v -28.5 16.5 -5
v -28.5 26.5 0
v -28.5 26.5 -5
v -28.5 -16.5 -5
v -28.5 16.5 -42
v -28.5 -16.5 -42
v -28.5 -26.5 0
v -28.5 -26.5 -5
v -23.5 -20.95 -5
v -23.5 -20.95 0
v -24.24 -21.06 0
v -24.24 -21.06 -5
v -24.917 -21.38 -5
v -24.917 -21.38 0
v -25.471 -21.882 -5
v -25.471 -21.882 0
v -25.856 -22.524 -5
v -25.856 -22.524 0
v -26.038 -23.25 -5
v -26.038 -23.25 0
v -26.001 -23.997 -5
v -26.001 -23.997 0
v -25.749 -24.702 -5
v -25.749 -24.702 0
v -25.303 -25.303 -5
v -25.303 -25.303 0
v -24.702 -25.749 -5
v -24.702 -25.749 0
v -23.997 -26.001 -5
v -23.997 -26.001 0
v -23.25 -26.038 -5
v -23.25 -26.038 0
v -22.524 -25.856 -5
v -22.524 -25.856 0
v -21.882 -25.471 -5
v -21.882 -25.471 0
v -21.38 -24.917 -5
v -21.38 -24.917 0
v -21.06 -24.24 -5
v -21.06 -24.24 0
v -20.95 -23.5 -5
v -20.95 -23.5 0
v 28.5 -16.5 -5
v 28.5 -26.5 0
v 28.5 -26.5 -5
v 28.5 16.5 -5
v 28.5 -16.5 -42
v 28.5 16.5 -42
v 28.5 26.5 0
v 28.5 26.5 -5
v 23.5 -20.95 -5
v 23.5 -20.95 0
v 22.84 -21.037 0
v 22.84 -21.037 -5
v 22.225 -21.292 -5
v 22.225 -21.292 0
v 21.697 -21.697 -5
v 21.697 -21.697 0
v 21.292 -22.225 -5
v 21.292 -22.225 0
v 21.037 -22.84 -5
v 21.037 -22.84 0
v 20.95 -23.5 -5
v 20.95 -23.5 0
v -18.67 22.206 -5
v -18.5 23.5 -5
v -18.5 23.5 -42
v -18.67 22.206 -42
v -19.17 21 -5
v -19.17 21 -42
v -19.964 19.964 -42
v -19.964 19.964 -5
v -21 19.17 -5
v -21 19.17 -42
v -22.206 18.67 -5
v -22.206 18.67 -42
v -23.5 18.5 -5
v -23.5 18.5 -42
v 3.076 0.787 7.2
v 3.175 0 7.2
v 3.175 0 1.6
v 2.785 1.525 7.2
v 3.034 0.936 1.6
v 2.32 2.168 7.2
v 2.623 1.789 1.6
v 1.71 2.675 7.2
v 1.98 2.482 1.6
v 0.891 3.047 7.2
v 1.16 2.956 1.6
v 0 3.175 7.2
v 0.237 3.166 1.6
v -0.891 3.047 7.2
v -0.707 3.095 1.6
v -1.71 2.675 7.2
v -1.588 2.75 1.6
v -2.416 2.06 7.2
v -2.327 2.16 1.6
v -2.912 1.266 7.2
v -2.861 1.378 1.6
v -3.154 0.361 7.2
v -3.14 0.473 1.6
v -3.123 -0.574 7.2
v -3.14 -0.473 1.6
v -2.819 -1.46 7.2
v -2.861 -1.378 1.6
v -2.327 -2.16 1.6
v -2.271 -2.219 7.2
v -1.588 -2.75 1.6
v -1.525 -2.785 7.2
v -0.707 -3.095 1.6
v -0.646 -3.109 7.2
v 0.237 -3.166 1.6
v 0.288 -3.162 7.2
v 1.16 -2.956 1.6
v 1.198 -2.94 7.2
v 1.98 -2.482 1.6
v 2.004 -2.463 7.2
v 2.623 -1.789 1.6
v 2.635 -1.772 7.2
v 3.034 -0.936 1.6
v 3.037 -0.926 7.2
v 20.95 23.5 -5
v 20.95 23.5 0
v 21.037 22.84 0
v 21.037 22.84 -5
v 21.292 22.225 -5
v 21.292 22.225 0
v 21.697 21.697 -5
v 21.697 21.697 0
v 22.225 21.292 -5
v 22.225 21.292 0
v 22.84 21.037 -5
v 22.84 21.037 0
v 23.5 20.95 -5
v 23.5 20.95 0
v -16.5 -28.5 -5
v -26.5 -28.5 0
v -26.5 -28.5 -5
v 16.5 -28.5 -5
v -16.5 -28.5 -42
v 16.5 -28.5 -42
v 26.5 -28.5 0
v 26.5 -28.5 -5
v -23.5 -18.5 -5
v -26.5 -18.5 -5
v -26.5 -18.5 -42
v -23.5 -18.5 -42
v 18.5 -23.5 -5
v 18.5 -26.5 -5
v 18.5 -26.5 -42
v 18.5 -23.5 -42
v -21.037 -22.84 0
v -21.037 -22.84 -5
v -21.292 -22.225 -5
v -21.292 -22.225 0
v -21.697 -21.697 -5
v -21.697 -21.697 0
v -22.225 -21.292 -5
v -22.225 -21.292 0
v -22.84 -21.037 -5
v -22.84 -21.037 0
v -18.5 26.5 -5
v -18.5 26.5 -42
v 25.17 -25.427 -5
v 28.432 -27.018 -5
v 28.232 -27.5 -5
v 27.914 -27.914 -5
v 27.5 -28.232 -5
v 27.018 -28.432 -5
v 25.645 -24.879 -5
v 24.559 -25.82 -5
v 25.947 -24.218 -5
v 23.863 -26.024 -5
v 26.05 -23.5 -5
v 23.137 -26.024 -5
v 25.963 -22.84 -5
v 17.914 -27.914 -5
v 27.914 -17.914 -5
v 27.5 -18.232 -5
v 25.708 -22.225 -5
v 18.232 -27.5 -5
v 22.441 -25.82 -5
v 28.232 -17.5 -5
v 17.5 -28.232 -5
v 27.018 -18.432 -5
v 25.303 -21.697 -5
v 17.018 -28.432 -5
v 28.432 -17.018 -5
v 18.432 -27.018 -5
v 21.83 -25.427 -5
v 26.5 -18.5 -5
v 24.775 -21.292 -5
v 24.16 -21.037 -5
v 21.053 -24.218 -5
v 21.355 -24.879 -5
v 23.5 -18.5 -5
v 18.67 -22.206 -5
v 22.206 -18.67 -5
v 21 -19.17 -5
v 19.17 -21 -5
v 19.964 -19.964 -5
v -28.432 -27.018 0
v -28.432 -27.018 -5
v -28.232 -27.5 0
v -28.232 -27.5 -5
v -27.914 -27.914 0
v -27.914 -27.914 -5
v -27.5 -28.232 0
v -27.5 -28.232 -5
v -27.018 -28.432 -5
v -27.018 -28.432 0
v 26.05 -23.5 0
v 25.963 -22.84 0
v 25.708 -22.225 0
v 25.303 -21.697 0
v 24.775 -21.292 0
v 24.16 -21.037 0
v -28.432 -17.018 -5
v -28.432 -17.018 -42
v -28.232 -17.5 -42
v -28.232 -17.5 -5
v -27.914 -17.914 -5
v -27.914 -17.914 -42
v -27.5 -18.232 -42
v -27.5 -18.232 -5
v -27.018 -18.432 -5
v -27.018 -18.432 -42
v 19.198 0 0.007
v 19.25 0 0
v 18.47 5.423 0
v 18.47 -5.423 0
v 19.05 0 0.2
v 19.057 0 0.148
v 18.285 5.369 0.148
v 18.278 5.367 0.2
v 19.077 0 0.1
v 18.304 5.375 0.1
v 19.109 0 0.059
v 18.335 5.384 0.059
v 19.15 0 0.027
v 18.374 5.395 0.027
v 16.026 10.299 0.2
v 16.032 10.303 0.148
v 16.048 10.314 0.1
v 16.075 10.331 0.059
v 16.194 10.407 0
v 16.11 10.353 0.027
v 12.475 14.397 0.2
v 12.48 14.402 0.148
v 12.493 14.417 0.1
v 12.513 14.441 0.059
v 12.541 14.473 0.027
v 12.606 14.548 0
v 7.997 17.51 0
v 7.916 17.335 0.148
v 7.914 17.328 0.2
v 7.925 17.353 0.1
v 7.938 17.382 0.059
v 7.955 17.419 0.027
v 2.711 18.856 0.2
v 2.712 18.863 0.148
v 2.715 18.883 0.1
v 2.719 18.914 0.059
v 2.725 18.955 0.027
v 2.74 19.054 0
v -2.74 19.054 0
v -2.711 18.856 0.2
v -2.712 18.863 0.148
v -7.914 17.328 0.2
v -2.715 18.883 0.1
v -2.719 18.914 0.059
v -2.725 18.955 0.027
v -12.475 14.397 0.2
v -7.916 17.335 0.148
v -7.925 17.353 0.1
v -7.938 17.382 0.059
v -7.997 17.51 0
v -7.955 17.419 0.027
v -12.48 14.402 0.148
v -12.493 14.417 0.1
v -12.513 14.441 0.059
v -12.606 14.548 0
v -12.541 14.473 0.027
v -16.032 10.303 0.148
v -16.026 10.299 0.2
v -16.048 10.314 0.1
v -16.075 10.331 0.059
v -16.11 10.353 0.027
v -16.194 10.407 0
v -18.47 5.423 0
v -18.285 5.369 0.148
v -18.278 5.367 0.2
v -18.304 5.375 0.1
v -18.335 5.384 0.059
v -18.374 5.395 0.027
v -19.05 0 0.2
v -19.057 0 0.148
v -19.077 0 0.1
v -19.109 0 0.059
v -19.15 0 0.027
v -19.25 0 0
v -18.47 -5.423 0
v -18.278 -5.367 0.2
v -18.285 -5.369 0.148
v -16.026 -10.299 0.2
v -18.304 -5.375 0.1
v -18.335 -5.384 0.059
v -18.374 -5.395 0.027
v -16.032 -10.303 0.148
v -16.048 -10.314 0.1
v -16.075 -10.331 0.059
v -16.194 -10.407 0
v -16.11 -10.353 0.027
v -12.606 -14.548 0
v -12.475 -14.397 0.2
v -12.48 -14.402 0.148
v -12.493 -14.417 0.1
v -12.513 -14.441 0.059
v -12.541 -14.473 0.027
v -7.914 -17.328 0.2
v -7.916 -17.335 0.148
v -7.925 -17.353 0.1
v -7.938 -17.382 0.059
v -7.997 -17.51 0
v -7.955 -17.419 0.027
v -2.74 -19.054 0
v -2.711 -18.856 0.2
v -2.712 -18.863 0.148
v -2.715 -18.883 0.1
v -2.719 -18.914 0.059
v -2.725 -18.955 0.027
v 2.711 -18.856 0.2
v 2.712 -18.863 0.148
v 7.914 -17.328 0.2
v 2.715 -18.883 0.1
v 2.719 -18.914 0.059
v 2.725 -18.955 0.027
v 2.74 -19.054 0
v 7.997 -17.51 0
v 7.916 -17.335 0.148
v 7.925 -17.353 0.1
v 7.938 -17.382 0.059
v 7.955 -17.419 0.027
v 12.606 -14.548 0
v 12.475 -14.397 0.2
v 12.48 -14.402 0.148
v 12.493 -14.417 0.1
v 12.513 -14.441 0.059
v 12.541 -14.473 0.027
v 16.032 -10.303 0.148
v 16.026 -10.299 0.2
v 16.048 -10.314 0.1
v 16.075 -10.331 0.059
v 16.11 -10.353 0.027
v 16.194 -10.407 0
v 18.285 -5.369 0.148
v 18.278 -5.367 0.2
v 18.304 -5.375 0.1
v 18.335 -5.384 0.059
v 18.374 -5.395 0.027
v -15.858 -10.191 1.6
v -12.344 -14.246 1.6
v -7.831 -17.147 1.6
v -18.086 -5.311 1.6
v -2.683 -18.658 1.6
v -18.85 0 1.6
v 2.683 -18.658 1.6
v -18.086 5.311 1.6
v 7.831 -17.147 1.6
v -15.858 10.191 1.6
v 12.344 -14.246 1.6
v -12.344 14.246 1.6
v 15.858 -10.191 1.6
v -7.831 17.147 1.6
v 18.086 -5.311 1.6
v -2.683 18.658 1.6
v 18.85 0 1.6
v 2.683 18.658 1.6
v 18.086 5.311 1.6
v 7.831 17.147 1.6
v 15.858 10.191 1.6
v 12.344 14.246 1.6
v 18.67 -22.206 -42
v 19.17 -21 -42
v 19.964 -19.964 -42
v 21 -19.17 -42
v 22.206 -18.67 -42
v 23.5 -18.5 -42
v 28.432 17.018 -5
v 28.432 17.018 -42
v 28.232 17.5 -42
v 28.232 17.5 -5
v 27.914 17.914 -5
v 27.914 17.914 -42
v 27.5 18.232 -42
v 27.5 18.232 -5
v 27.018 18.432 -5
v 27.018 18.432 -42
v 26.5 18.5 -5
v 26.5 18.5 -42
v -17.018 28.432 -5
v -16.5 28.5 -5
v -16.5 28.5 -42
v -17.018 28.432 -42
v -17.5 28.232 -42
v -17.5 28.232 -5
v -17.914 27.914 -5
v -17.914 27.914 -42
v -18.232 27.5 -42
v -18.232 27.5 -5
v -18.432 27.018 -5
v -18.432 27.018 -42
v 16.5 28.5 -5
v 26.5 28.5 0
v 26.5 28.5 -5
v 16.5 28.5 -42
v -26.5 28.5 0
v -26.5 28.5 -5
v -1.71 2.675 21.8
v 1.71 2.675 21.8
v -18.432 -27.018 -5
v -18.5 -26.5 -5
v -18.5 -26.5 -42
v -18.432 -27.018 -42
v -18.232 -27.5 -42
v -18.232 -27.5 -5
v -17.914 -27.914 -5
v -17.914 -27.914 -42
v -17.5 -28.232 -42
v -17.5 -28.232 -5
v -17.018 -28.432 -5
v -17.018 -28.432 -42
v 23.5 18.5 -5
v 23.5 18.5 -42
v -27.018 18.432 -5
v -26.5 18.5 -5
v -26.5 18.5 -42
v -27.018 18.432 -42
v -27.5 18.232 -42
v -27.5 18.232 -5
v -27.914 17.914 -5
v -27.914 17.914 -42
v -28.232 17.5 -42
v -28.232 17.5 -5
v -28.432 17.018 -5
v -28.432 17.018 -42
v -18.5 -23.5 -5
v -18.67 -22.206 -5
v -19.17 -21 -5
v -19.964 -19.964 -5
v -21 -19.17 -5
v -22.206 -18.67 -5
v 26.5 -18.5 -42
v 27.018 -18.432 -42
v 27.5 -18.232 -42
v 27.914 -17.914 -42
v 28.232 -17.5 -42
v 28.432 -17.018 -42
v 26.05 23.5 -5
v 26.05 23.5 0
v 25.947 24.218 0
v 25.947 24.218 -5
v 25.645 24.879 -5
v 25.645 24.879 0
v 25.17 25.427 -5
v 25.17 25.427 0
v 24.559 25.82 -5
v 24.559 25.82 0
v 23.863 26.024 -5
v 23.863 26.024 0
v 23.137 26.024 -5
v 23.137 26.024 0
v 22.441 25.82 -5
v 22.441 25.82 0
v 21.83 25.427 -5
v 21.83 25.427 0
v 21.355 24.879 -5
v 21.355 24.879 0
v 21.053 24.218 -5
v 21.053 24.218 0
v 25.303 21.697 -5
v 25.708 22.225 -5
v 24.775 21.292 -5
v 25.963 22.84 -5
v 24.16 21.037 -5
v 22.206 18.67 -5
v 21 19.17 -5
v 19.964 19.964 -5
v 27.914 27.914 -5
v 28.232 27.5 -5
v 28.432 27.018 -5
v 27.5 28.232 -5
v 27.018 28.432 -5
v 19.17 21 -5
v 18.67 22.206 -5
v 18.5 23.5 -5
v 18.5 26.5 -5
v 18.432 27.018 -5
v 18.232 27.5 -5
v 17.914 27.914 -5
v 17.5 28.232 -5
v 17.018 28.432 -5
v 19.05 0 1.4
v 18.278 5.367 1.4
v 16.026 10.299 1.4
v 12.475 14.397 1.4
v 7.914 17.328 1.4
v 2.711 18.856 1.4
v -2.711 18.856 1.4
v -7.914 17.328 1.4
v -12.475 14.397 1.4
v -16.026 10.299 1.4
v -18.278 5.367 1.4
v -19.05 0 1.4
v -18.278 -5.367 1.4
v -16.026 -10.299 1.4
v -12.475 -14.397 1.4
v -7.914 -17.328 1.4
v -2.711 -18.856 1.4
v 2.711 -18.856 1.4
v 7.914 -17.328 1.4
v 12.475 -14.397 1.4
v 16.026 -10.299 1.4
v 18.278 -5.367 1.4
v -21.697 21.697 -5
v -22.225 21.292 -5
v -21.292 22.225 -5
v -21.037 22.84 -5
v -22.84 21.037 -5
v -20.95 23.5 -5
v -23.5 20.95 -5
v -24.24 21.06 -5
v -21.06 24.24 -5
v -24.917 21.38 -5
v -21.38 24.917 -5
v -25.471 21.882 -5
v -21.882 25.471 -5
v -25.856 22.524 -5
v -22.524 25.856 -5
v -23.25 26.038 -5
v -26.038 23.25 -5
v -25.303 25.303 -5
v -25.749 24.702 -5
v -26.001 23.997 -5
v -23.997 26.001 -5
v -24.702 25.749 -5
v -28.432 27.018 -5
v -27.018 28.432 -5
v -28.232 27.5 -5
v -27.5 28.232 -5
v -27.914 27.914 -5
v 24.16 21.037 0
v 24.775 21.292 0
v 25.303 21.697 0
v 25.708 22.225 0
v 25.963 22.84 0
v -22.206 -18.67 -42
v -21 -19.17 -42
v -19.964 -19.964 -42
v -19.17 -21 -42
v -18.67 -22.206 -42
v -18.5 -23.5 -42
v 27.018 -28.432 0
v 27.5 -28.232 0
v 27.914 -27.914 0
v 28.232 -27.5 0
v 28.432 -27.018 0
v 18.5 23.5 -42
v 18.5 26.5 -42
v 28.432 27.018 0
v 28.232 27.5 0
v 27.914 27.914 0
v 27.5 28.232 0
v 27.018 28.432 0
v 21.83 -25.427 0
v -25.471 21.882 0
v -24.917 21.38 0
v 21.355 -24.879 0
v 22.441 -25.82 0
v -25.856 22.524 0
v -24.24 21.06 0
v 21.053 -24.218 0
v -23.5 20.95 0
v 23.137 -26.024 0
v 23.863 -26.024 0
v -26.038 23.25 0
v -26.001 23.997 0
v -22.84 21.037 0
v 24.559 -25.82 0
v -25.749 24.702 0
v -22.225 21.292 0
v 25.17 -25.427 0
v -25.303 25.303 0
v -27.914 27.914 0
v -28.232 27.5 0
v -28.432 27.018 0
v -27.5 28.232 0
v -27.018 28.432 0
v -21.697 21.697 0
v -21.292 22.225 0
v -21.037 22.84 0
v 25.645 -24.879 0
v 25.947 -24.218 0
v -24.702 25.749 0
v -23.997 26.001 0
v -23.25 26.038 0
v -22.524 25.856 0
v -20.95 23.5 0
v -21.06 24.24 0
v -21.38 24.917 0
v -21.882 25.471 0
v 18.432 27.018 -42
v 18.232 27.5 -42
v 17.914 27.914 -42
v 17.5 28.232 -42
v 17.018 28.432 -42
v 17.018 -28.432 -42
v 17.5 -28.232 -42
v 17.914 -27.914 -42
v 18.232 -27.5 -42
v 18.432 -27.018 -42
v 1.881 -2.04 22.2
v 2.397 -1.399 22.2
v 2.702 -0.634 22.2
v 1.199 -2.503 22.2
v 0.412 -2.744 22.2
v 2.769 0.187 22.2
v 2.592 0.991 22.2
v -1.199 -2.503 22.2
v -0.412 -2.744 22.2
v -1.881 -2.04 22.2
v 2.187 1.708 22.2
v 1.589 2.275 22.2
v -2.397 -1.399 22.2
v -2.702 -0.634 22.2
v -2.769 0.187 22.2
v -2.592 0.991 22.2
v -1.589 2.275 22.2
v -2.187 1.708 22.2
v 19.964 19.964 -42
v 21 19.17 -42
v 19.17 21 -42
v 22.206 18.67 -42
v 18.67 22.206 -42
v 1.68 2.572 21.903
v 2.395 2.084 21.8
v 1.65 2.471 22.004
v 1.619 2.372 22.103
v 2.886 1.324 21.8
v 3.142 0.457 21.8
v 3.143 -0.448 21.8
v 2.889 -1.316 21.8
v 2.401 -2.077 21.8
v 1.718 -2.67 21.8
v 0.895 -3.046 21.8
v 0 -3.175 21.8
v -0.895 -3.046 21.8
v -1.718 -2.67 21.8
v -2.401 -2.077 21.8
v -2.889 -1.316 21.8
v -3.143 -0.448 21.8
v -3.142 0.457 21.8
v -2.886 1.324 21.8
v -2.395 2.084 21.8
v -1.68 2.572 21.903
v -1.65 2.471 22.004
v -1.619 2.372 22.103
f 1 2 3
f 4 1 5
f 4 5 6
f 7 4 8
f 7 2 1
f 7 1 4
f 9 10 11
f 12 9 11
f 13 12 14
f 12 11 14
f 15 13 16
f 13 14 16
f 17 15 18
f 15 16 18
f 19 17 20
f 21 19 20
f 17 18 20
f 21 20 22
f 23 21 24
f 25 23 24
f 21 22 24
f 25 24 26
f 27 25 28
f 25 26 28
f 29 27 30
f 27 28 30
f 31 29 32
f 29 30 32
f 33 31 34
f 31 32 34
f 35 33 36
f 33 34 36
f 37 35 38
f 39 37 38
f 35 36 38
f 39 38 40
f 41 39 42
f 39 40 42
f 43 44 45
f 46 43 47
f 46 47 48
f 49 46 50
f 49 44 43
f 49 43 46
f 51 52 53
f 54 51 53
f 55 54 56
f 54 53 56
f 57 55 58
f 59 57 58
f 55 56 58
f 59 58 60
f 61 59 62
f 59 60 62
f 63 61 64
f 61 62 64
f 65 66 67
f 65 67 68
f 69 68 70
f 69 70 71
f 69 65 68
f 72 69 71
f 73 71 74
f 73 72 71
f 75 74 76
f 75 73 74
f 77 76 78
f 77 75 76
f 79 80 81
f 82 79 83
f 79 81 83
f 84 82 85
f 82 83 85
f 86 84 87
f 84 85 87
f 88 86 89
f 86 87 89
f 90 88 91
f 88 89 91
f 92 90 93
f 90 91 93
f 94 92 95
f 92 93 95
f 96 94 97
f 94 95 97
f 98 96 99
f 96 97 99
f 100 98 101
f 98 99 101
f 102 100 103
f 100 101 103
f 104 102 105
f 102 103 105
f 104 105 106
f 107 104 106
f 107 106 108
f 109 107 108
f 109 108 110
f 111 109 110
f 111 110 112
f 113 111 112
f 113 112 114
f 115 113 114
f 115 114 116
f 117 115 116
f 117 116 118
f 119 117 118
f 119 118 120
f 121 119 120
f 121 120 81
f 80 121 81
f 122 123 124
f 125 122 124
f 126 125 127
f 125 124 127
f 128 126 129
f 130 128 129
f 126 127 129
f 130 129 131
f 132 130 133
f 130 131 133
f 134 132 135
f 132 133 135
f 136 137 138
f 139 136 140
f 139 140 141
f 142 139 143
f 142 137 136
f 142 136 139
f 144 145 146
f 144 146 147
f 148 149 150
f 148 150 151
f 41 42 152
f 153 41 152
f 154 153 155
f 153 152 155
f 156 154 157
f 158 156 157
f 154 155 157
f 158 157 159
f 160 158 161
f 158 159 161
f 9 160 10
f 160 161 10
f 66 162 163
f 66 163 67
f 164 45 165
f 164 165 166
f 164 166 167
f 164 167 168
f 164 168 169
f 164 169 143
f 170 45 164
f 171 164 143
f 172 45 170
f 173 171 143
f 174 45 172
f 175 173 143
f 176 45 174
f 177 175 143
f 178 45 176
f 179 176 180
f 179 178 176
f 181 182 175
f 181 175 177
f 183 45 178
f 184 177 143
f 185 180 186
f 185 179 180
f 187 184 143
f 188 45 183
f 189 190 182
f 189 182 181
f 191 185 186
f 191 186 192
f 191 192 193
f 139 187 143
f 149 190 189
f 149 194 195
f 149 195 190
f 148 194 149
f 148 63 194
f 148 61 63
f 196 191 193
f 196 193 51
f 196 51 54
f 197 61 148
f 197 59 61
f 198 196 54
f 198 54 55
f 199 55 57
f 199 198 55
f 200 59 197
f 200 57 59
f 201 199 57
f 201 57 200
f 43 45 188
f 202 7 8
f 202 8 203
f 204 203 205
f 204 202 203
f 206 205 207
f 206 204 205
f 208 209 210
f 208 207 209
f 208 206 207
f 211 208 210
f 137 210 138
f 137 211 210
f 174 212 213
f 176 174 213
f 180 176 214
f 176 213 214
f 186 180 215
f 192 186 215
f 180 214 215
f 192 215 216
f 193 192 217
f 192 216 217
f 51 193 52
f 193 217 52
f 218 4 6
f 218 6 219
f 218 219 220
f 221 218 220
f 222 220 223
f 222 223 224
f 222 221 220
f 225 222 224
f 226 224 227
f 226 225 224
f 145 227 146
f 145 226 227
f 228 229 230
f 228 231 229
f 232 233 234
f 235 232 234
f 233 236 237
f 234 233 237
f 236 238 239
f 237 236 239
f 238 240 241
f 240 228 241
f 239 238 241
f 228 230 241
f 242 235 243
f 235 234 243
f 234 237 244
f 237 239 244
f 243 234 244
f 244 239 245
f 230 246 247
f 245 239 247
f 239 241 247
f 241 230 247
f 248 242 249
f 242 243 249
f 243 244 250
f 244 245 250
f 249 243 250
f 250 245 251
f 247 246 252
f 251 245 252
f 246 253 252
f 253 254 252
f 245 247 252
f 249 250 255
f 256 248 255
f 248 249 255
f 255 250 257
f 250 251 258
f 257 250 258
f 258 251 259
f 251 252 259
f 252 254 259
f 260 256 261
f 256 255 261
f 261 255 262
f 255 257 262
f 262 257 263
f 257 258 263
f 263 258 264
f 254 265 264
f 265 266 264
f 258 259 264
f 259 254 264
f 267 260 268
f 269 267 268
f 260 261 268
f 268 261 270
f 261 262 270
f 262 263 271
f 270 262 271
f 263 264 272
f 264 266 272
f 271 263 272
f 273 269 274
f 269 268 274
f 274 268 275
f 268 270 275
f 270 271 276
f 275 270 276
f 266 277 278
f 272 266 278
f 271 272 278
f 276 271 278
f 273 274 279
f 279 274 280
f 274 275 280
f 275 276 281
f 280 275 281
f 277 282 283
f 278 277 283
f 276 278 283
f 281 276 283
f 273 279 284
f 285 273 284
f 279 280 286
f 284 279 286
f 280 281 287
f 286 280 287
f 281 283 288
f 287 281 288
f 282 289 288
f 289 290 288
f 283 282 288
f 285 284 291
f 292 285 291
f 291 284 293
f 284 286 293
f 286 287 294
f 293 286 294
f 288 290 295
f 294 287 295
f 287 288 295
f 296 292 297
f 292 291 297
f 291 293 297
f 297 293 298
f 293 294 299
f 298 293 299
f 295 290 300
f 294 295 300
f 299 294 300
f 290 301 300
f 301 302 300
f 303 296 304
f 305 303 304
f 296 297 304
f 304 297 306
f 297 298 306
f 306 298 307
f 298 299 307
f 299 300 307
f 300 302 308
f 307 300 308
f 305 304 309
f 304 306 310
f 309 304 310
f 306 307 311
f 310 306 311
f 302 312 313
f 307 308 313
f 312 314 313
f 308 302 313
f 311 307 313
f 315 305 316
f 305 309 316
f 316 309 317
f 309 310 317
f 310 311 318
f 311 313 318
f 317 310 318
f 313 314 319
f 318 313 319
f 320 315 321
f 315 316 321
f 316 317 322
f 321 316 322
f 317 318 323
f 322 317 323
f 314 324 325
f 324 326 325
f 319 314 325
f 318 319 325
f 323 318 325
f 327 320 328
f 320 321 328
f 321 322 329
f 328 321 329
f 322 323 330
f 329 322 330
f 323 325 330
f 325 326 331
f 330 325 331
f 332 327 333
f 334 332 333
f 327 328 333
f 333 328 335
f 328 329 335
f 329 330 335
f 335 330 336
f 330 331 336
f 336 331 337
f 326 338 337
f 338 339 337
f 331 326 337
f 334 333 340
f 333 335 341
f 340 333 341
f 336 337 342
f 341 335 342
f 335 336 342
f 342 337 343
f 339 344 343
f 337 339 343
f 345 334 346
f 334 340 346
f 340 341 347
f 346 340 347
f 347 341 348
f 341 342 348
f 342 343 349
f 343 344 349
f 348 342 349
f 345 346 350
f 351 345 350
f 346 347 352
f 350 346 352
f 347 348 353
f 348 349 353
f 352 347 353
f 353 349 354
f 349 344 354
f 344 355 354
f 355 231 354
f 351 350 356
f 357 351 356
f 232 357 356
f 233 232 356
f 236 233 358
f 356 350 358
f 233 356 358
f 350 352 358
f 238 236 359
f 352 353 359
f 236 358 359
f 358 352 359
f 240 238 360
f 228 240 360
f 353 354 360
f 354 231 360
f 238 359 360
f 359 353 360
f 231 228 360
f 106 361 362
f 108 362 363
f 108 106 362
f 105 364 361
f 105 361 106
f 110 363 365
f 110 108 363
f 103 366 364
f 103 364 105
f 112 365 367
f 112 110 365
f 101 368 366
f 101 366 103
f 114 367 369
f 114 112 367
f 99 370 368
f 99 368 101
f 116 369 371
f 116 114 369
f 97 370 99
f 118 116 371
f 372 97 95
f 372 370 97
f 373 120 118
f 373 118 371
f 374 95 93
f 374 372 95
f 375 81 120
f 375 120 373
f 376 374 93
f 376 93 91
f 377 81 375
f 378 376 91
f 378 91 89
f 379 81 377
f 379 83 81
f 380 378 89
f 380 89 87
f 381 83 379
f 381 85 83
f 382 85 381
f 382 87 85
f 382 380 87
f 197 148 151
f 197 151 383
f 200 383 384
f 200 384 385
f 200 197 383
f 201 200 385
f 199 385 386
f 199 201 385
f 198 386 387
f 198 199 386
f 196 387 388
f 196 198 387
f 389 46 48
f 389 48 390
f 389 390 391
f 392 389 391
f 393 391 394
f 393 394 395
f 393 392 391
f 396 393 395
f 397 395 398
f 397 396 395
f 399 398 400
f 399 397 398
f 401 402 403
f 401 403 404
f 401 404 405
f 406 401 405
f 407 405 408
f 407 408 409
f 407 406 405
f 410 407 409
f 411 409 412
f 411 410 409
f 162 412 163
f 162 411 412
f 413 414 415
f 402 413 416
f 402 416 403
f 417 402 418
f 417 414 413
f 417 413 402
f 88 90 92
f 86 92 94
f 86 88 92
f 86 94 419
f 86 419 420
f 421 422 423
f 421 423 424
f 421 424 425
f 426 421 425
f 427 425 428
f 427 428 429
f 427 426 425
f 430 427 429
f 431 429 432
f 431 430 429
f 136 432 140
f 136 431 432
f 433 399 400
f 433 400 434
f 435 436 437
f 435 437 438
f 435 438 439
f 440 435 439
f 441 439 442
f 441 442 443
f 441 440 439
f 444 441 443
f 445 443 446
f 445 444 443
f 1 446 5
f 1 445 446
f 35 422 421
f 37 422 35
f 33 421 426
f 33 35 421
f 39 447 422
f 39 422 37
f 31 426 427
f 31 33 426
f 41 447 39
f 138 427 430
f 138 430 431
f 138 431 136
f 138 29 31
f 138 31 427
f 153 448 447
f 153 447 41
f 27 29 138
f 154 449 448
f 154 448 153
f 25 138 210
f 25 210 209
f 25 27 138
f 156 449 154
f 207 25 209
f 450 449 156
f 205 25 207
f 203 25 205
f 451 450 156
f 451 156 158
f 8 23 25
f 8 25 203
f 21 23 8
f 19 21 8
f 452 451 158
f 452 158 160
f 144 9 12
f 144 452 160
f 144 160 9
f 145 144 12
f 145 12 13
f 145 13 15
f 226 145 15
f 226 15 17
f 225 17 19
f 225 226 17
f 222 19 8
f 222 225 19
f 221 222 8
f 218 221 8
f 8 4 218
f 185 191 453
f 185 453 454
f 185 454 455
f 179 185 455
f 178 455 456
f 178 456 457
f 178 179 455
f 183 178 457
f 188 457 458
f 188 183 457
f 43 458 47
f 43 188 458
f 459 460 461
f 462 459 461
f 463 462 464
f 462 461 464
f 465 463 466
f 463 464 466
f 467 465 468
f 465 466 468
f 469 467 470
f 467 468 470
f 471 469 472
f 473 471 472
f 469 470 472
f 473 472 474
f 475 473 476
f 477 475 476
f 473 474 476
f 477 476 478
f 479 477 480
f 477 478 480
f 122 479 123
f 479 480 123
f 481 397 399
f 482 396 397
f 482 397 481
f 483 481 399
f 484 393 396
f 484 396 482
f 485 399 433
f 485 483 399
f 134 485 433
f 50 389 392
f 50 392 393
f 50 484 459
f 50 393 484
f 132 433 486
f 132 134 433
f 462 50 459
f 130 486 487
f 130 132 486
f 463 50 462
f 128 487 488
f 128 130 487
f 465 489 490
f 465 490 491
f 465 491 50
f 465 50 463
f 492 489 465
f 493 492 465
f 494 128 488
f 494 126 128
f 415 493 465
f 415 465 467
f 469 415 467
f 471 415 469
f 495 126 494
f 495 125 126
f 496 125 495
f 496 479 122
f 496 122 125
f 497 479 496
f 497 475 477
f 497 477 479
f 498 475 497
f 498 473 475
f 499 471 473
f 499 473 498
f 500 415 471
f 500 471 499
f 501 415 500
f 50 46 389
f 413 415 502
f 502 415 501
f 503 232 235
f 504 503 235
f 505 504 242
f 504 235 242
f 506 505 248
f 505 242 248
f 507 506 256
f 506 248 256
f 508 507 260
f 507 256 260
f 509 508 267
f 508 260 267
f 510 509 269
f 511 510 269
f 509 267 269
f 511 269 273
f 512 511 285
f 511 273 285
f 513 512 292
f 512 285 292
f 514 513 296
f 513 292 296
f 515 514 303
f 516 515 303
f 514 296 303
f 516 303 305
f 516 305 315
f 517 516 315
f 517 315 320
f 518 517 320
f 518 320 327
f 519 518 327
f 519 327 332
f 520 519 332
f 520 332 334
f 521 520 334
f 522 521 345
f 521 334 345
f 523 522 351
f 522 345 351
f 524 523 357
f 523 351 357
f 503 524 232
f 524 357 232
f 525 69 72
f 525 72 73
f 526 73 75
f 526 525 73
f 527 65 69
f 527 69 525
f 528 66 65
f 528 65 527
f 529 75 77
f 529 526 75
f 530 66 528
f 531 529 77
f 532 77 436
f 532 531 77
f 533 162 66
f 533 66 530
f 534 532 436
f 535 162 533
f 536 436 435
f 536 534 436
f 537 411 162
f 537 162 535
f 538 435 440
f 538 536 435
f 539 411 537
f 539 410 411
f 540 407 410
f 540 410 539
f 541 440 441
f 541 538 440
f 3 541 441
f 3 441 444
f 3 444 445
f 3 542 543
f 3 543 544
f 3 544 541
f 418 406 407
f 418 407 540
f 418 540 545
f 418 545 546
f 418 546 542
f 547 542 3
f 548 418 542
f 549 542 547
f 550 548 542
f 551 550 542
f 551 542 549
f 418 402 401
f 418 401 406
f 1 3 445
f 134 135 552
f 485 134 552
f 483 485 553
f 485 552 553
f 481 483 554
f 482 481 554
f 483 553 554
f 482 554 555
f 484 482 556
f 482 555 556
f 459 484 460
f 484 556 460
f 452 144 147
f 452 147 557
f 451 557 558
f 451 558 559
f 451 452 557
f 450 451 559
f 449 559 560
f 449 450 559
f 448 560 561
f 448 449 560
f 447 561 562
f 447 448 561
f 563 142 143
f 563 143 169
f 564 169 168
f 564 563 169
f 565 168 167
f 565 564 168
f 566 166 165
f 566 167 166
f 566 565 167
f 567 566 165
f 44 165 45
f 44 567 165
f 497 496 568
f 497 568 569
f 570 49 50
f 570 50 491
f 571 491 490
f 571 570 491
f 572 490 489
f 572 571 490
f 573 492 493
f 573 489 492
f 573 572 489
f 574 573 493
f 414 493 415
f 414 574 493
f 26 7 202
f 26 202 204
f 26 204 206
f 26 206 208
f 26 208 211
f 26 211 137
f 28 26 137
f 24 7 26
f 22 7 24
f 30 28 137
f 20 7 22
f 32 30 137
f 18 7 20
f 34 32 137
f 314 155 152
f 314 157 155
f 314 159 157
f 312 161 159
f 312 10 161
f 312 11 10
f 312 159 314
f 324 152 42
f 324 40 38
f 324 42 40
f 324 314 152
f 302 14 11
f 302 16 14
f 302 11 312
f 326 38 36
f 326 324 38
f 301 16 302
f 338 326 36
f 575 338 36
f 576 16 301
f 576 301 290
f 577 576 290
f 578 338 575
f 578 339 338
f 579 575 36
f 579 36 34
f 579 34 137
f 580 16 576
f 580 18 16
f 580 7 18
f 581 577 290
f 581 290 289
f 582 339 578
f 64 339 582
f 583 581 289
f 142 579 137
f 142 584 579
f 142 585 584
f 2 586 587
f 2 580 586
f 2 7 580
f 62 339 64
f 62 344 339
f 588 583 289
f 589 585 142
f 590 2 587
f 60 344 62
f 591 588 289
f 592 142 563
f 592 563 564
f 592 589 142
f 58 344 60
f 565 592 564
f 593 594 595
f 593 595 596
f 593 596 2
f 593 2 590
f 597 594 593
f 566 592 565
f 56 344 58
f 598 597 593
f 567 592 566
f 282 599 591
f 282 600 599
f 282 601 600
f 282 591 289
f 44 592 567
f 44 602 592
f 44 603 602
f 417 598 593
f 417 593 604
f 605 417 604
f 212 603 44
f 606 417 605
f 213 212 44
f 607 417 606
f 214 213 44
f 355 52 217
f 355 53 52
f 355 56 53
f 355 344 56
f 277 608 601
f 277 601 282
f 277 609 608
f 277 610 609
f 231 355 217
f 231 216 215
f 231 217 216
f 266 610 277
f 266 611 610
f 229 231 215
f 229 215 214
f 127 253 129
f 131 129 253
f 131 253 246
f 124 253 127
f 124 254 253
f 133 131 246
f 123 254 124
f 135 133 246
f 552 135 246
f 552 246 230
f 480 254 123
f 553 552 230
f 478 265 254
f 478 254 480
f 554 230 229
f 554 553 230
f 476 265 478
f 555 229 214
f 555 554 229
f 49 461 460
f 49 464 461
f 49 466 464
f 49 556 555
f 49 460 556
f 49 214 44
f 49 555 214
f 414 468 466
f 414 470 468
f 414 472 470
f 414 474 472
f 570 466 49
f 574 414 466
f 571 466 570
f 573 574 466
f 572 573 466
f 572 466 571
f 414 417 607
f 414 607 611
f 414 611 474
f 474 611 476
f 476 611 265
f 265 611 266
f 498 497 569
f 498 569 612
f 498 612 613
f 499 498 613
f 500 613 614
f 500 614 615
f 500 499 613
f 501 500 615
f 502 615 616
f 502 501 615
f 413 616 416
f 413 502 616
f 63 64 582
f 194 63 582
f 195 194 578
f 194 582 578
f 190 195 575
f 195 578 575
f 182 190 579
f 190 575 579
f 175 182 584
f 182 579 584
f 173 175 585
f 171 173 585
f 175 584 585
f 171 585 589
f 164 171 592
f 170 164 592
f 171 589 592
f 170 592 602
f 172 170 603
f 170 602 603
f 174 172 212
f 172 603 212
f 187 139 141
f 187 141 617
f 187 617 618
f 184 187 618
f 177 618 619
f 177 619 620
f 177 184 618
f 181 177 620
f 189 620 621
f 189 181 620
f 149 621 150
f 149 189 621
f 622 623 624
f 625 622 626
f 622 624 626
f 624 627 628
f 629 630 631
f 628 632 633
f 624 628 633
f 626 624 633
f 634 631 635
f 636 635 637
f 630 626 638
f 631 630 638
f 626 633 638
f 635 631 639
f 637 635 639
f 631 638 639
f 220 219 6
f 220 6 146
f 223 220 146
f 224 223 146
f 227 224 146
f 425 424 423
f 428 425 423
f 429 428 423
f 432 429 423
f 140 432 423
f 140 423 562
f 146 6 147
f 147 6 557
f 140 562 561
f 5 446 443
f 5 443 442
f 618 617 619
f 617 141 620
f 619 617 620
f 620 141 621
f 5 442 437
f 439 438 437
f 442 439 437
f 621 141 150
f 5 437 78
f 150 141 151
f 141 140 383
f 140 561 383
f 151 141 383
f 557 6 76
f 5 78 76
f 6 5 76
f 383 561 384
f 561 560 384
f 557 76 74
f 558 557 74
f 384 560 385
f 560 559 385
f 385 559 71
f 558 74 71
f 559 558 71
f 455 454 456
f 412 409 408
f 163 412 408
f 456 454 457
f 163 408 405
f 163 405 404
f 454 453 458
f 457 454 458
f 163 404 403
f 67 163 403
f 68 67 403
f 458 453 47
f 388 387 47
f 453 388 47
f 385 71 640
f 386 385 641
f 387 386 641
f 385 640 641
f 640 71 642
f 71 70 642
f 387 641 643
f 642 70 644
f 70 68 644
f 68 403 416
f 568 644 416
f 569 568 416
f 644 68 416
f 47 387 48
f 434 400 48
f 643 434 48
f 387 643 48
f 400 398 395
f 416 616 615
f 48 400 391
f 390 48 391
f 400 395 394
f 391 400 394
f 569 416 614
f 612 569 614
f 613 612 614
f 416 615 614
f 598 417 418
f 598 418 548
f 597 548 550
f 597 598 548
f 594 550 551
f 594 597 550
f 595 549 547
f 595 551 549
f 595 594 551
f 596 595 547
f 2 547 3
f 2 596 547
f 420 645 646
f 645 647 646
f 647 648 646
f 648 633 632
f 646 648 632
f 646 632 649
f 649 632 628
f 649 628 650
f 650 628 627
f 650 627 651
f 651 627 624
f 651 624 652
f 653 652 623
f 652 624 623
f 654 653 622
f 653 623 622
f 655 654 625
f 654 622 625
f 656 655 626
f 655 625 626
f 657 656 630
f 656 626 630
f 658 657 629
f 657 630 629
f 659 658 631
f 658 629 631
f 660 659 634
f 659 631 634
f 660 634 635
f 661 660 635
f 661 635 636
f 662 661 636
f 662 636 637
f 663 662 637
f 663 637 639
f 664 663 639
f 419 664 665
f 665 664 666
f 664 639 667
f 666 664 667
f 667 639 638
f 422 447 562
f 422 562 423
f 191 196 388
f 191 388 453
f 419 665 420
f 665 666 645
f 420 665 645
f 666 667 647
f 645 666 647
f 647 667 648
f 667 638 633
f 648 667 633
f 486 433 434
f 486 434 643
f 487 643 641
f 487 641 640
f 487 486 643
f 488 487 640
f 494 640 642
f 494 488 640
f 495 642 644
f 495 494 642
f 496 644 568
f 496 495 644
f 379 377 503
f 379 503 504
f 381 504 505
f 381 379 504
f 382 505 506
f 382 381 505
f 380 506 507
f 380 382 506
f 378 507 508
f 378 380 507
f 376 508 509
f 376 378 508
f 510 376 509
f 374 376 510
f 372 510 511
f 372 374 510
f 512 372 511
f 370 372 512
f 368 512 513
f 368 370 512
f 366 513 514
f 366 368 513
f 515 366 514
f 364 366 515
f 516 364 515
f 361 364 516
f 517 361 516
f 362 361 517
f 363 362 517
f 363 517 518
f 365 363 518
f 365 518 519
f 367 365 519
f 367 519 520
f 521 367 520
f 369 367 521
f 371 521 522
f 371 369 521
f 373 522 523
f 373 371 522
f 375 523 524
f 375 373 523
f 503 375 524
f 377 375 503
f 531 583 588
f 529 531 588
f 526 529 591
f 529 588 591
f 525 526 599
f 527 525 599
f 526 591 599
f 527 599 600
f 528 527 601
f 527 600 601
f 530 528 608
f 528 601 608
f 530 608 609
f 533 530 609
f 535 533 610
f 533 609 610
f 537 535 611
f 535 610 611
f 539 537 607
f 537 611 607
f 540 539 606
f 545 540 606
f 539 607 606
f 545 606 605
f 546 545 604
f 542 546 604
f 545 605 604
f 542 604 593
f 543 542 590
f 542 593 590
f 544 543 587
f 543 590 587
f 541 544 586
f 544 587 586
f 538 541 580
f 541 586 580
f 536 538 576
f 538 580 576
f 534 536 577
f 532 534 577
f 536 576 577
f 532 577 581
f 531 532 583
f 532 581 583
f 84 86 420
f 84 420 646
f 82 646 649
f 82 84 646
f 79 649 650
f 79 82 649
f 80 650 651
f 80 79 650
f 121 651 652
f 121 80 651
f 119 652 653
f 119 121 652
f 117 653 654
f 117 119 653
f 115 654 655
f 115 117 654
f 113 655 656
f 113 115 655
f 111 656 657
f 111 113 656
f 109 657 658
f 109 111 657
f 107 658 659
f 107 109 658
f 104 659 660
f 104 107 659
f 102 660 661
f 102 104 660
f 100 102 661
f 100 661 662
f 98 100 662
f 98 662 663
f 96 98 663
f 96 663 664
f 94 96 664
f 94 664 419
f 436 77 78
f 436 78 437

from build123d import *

# Parameters (mm, degrees)
BOSS_EXTRU_1_DEPTH      = 42
ESQUISSE3_R             = 19.05
BOSS_EXTRU_2_DEPTH      = 1.6
CHANFREIN1_SIZE         = 0.2
CONG_1_R                = 0.2
ESQUISSE4_R             = 3.175
BOSS_EXTRU_3_DEPTH      = 5.6
BOSS_EXTRU_4_DEPTH      = 15
CHANFREIN2_SIZE         = 0.4
ENL_V_START             = -37
ENL_V_MAT_EXTRU_1_DEPTH = 37
ENL_V_MAT_EXTRU_2_DEPTH = 59.210823736


with BuildPart() as part:
    # Esquisse1 → Boss.-Extru.1 (new body)
    with BuildSketch(Plane.XY):
        with BuildLine():
            Line((-26.5, -28.5), (26.5, -28.5))
            ThreePointArc((26.5, -28.5), (27.914213562, -27.914213562), (28.5, -26.5))
            Line((28.5, -26.5), (28.5, 26.5))
            ThreePointArc((28.5, 26.5), (27.914213562, 27.914213562), (26.5, 28.5))
            Line((26.5, 28.5), (-26.5, 28.5))
            ThreePointArc((-26.5, 28.5), (-27.914213562, 27.914213562), (-28.5, 26.5))
            Line((-28.5, 26.5), (-28.5, -26.5))
            ThreePointArc((-28.5, -26.5), (-27.914213562, -27.914213562), (-26.5, -28.5))
        make_face()
    extrude(amount=-BOSS_EXTRU_1_DEPTH)

    # Esquisse3 → Boss.-Extru.2 (add)
    with BuildSketch(Plane.XY):
        Circle(ESQUISSE3_R)
    extrude(amount=BOSS_EXTRU_2_DEPTH)

    # Chanfrein1
    chanfrein1_edges = [part.edges().sort_by_distance(p)[0] for p in [
        (-19.05, 0, 1.6),
    ]]
    chamfer(chanfrein1_edges, length=CHANFREIN1_SIZE)

    # Congé1
    cong_1_edges = [part.edges().sort_by_distance(p)[0] for p in [
        (-19.05, 0, 0),
    ]]
    fillet(cong_1_edges, radius=CONG_1_R)

    # Esquisse4 → Boss.-Extru.3 (add)
    with BuildSketch(Plane.XY.offset(1.6)):
        Circle(ESQUISSE4_R)
    extrude(amount=BOSS_EXTRU_3_DEPTH)

    # Esquisse5 → Boss.-Extru.4 (add)
    with BuildSketch(Plane.XY.offset(7.2)):
        with BuildLine():
            Line((-1.710263138, 2.675), (1.710263138, 2.675))
            ThreePointArc((1.710263138, 2.675), (0, -3.175), (-1.710263138, 2.675))
        make_face()
    extrude(amount=BOSS_EXTRU_4_DEPTH)

    # Chanfrein2
    chanfrein2_edges = [part.edges().sort_by_distance(p)[0] for p in [
        (0, -3.175, 22.2),
        (0, 2.675, 22.2),
    ]]
    chamfer(chanfrein2_edges, length=CHANFREIN2_SIZE)

    # Esquisse7 → Enlèv. mat.-Extru.1 (cut)
    with BuildSketch(Plane(origin=(0, 0, -42), x_dir=(-1, 0, 0), z_dir=(0, 0, -1)).offset(ENL_V_START)):
        with BuildLine():
            Line((-28.5, 26.5), (-28.5, 16.5))
            ThreePointArc((-28.5, 16.5), (-27.914213562, 17.914213562), (-26.5, 18.5))
            Line((-26.5, 18.5), (-23.5, 18.5))
            ThreePointArc((-23.5, 18.5), (-19.964466094, 19.964466094), (-18.5, 23.5))
            Line((-18.5, 23.5), (-18.5, 26.5))
            ThreePointArc((-18.5, 26.5), (-17.914213562, 27.914213562), (-16.5, 28.5))
            Line((-16.5, 28.5), (-26.5, 28.5))
            ThreePointArc((-26.5, 28.5), (-27.914213562, 27.914213562), (-28.5, 26.5))
        make_face()
        with BuildLine():
            Line((26.5, 28.5), (16.5, 28.5))
            ThreePointArc((16.5, 28.5), (17.914213562, 27.914213562), (18.5, 26.5))
            Line((18.5, 26.5), (18.5, 23.5))
            ThreePointArc((18.5, 23.5), (19.964466094, 19.964466094), (23.5, 18.5))
            Line((23.5, 18.5), (26.5, 18.5))
            ThreePointArc((26.5, 18.5), (27.914213562, 17.914213562), (28.5, 16.5))
            Line((28.5, 16.5), (28.5, 26.5))
            ThreePointArc((28.5, 26.5), (27.914213562, 27.914213562), (26.5, 28.5))
        make_face()
        with BuildLine():
            ThreePointArc((18.5, -26.5), (17.914213562, -27.914213562), (16.5, -28.5))
            Line((16.5, -28.5), (26.5, -28.5))
            ThreePointArc((26.5, -28.5), (27.914213562, -27.914213562), (28.5, -26.5))
            Line((28.5, -26.5), (28.5, -16.5))
            ThreePointArc((28.5, -16.5), (27.914213562, -17.914213562), (26.5, -18.5))
            Line((26.5, -18.5), (23.5, -18.5))
            ThreePointArc((23.5, -18.5), (19.964466094, -19.964466094), (18.5, -23.5))
            Line((18.5, -23.5), (18.5, -26.5))
        make_face()
        with BuildLine():
            ThreePointArc((-18.5, -23.5), (-19.964466094, -19.964466094), (-23.5, -18.5))
            Line((-23.5, -18.5), (-26.5, -18.5))
            ThreePointArc((-26.5, -18.5), (-27.914213562, -17.914213562), (-28.5, -16.5))
            Line((-28.5, -16.5), (-28.5, -26.5))
            ThreePointArc((-28.5, -26.5), (-27.914213562, -27.914213562), (-26.5, -28.5))
            Line((-26.5, -28.5), (-16.5, -28.5))
            ThreePointArc((-16.5, -28.5), (-17.914213562, -27.914213562), (-18.5, -26.5))
            Line((-18.5, -26.5), (-18.5, -23.5))
        make_face()
    extrude(amount=ENL_V_MAT_EXTRU_1_DEPTH, mode=Mode.SUBTRACT)

    # Esquisse6 → Enlèv. mat.-Extru.2 (cut, through all)
    with BuildSketch(Plane.XY):
        with BuildLine():
            Line((-23.5, 20.95), (-23.5, 23.5))
            Line((-23.5, 23.5), (-20.95, 23.5))
            ThreePointArc((-20.95, 23.5), (-25.303122292, 25.303122292), (-23.5, 20.95))
        make_face()
        with BuildLine():
            Line((-20.95, 23.5), (-23.5, 23.5))
            Line((-23.5, 23.5), (-23.5, 20.95))
            ThreePointArc((-23.5, 20.95), (-21.696877708, 21.696877708), (-20.95, 23.5))
        make_face()
        with BuildLine():
            ThreePointArc((26.05, 23.5), (23.5, 26.05), (20.95, 23.5))
            Line((20.95, 23.5), (23.5, 23.5))
            Line((23.5, 23.5), (23.5, 20.95))
            ThreePointArc((23.5, 20.95), (25.303122292, 21.696877708), (26.05, 23.5))
        make_face()
        with BuildLine():
            Line((23.5, 23.5), (20.95, 23.5))
            ThreePointArc((20.95, 23.5), (21.696877708, 21.696877708), (23.5, 20.95))
            Line((23.5, 20.95), (23.5, 23.5))
        make_face()
        with BuildLine():
            ThreePointArc((26.05, -23.5), (25.303122292, -21.696877708), (23.5, -20.95))
            Line((23.5, -20.95), (23.5, -23.5))
            Line((23.5, -23.5), (20.95, -23.5))
            ThreePointArc((20.95, -23.5), (23.5, -26.05), (26.05, -23.5))
        make_face()
        with BuildLine():
            Line((23.5, -23.5), (23.5, -20.95))
            ThreePointArc((23.5, -20.95), (21.696877708, -21.696877708), (20.95, -23.5))
            Line((20.95, -23.5), (23.5, -23.5))
        make_face()
        with BuildLine():
            ThreePointArc((-20.95, -23.5), (-21.696877708, -21.696877708), (-23.5, -20.95))
            Line((-23.5, -20.95), (-23.5, -23.5))
            Line((-23.5, -23.5), (-20.95, -23.5))
        make_face()
        with BuildLine():
            Line((-23.5, -23.5), (-23.5, -20.95))
            ThreePointArc((-23.5, -20.95), (-25.303122292, -25.303122292), (-20.95, -23.5))
            Line((-20.95, -23.5), (-23.5, -23.5))
        make_face()
    extrude(amount=-ENL_V_MAT_EXTRU_2_DEPTH, mode=Mode.SUBTRACT)


solid = part.part
